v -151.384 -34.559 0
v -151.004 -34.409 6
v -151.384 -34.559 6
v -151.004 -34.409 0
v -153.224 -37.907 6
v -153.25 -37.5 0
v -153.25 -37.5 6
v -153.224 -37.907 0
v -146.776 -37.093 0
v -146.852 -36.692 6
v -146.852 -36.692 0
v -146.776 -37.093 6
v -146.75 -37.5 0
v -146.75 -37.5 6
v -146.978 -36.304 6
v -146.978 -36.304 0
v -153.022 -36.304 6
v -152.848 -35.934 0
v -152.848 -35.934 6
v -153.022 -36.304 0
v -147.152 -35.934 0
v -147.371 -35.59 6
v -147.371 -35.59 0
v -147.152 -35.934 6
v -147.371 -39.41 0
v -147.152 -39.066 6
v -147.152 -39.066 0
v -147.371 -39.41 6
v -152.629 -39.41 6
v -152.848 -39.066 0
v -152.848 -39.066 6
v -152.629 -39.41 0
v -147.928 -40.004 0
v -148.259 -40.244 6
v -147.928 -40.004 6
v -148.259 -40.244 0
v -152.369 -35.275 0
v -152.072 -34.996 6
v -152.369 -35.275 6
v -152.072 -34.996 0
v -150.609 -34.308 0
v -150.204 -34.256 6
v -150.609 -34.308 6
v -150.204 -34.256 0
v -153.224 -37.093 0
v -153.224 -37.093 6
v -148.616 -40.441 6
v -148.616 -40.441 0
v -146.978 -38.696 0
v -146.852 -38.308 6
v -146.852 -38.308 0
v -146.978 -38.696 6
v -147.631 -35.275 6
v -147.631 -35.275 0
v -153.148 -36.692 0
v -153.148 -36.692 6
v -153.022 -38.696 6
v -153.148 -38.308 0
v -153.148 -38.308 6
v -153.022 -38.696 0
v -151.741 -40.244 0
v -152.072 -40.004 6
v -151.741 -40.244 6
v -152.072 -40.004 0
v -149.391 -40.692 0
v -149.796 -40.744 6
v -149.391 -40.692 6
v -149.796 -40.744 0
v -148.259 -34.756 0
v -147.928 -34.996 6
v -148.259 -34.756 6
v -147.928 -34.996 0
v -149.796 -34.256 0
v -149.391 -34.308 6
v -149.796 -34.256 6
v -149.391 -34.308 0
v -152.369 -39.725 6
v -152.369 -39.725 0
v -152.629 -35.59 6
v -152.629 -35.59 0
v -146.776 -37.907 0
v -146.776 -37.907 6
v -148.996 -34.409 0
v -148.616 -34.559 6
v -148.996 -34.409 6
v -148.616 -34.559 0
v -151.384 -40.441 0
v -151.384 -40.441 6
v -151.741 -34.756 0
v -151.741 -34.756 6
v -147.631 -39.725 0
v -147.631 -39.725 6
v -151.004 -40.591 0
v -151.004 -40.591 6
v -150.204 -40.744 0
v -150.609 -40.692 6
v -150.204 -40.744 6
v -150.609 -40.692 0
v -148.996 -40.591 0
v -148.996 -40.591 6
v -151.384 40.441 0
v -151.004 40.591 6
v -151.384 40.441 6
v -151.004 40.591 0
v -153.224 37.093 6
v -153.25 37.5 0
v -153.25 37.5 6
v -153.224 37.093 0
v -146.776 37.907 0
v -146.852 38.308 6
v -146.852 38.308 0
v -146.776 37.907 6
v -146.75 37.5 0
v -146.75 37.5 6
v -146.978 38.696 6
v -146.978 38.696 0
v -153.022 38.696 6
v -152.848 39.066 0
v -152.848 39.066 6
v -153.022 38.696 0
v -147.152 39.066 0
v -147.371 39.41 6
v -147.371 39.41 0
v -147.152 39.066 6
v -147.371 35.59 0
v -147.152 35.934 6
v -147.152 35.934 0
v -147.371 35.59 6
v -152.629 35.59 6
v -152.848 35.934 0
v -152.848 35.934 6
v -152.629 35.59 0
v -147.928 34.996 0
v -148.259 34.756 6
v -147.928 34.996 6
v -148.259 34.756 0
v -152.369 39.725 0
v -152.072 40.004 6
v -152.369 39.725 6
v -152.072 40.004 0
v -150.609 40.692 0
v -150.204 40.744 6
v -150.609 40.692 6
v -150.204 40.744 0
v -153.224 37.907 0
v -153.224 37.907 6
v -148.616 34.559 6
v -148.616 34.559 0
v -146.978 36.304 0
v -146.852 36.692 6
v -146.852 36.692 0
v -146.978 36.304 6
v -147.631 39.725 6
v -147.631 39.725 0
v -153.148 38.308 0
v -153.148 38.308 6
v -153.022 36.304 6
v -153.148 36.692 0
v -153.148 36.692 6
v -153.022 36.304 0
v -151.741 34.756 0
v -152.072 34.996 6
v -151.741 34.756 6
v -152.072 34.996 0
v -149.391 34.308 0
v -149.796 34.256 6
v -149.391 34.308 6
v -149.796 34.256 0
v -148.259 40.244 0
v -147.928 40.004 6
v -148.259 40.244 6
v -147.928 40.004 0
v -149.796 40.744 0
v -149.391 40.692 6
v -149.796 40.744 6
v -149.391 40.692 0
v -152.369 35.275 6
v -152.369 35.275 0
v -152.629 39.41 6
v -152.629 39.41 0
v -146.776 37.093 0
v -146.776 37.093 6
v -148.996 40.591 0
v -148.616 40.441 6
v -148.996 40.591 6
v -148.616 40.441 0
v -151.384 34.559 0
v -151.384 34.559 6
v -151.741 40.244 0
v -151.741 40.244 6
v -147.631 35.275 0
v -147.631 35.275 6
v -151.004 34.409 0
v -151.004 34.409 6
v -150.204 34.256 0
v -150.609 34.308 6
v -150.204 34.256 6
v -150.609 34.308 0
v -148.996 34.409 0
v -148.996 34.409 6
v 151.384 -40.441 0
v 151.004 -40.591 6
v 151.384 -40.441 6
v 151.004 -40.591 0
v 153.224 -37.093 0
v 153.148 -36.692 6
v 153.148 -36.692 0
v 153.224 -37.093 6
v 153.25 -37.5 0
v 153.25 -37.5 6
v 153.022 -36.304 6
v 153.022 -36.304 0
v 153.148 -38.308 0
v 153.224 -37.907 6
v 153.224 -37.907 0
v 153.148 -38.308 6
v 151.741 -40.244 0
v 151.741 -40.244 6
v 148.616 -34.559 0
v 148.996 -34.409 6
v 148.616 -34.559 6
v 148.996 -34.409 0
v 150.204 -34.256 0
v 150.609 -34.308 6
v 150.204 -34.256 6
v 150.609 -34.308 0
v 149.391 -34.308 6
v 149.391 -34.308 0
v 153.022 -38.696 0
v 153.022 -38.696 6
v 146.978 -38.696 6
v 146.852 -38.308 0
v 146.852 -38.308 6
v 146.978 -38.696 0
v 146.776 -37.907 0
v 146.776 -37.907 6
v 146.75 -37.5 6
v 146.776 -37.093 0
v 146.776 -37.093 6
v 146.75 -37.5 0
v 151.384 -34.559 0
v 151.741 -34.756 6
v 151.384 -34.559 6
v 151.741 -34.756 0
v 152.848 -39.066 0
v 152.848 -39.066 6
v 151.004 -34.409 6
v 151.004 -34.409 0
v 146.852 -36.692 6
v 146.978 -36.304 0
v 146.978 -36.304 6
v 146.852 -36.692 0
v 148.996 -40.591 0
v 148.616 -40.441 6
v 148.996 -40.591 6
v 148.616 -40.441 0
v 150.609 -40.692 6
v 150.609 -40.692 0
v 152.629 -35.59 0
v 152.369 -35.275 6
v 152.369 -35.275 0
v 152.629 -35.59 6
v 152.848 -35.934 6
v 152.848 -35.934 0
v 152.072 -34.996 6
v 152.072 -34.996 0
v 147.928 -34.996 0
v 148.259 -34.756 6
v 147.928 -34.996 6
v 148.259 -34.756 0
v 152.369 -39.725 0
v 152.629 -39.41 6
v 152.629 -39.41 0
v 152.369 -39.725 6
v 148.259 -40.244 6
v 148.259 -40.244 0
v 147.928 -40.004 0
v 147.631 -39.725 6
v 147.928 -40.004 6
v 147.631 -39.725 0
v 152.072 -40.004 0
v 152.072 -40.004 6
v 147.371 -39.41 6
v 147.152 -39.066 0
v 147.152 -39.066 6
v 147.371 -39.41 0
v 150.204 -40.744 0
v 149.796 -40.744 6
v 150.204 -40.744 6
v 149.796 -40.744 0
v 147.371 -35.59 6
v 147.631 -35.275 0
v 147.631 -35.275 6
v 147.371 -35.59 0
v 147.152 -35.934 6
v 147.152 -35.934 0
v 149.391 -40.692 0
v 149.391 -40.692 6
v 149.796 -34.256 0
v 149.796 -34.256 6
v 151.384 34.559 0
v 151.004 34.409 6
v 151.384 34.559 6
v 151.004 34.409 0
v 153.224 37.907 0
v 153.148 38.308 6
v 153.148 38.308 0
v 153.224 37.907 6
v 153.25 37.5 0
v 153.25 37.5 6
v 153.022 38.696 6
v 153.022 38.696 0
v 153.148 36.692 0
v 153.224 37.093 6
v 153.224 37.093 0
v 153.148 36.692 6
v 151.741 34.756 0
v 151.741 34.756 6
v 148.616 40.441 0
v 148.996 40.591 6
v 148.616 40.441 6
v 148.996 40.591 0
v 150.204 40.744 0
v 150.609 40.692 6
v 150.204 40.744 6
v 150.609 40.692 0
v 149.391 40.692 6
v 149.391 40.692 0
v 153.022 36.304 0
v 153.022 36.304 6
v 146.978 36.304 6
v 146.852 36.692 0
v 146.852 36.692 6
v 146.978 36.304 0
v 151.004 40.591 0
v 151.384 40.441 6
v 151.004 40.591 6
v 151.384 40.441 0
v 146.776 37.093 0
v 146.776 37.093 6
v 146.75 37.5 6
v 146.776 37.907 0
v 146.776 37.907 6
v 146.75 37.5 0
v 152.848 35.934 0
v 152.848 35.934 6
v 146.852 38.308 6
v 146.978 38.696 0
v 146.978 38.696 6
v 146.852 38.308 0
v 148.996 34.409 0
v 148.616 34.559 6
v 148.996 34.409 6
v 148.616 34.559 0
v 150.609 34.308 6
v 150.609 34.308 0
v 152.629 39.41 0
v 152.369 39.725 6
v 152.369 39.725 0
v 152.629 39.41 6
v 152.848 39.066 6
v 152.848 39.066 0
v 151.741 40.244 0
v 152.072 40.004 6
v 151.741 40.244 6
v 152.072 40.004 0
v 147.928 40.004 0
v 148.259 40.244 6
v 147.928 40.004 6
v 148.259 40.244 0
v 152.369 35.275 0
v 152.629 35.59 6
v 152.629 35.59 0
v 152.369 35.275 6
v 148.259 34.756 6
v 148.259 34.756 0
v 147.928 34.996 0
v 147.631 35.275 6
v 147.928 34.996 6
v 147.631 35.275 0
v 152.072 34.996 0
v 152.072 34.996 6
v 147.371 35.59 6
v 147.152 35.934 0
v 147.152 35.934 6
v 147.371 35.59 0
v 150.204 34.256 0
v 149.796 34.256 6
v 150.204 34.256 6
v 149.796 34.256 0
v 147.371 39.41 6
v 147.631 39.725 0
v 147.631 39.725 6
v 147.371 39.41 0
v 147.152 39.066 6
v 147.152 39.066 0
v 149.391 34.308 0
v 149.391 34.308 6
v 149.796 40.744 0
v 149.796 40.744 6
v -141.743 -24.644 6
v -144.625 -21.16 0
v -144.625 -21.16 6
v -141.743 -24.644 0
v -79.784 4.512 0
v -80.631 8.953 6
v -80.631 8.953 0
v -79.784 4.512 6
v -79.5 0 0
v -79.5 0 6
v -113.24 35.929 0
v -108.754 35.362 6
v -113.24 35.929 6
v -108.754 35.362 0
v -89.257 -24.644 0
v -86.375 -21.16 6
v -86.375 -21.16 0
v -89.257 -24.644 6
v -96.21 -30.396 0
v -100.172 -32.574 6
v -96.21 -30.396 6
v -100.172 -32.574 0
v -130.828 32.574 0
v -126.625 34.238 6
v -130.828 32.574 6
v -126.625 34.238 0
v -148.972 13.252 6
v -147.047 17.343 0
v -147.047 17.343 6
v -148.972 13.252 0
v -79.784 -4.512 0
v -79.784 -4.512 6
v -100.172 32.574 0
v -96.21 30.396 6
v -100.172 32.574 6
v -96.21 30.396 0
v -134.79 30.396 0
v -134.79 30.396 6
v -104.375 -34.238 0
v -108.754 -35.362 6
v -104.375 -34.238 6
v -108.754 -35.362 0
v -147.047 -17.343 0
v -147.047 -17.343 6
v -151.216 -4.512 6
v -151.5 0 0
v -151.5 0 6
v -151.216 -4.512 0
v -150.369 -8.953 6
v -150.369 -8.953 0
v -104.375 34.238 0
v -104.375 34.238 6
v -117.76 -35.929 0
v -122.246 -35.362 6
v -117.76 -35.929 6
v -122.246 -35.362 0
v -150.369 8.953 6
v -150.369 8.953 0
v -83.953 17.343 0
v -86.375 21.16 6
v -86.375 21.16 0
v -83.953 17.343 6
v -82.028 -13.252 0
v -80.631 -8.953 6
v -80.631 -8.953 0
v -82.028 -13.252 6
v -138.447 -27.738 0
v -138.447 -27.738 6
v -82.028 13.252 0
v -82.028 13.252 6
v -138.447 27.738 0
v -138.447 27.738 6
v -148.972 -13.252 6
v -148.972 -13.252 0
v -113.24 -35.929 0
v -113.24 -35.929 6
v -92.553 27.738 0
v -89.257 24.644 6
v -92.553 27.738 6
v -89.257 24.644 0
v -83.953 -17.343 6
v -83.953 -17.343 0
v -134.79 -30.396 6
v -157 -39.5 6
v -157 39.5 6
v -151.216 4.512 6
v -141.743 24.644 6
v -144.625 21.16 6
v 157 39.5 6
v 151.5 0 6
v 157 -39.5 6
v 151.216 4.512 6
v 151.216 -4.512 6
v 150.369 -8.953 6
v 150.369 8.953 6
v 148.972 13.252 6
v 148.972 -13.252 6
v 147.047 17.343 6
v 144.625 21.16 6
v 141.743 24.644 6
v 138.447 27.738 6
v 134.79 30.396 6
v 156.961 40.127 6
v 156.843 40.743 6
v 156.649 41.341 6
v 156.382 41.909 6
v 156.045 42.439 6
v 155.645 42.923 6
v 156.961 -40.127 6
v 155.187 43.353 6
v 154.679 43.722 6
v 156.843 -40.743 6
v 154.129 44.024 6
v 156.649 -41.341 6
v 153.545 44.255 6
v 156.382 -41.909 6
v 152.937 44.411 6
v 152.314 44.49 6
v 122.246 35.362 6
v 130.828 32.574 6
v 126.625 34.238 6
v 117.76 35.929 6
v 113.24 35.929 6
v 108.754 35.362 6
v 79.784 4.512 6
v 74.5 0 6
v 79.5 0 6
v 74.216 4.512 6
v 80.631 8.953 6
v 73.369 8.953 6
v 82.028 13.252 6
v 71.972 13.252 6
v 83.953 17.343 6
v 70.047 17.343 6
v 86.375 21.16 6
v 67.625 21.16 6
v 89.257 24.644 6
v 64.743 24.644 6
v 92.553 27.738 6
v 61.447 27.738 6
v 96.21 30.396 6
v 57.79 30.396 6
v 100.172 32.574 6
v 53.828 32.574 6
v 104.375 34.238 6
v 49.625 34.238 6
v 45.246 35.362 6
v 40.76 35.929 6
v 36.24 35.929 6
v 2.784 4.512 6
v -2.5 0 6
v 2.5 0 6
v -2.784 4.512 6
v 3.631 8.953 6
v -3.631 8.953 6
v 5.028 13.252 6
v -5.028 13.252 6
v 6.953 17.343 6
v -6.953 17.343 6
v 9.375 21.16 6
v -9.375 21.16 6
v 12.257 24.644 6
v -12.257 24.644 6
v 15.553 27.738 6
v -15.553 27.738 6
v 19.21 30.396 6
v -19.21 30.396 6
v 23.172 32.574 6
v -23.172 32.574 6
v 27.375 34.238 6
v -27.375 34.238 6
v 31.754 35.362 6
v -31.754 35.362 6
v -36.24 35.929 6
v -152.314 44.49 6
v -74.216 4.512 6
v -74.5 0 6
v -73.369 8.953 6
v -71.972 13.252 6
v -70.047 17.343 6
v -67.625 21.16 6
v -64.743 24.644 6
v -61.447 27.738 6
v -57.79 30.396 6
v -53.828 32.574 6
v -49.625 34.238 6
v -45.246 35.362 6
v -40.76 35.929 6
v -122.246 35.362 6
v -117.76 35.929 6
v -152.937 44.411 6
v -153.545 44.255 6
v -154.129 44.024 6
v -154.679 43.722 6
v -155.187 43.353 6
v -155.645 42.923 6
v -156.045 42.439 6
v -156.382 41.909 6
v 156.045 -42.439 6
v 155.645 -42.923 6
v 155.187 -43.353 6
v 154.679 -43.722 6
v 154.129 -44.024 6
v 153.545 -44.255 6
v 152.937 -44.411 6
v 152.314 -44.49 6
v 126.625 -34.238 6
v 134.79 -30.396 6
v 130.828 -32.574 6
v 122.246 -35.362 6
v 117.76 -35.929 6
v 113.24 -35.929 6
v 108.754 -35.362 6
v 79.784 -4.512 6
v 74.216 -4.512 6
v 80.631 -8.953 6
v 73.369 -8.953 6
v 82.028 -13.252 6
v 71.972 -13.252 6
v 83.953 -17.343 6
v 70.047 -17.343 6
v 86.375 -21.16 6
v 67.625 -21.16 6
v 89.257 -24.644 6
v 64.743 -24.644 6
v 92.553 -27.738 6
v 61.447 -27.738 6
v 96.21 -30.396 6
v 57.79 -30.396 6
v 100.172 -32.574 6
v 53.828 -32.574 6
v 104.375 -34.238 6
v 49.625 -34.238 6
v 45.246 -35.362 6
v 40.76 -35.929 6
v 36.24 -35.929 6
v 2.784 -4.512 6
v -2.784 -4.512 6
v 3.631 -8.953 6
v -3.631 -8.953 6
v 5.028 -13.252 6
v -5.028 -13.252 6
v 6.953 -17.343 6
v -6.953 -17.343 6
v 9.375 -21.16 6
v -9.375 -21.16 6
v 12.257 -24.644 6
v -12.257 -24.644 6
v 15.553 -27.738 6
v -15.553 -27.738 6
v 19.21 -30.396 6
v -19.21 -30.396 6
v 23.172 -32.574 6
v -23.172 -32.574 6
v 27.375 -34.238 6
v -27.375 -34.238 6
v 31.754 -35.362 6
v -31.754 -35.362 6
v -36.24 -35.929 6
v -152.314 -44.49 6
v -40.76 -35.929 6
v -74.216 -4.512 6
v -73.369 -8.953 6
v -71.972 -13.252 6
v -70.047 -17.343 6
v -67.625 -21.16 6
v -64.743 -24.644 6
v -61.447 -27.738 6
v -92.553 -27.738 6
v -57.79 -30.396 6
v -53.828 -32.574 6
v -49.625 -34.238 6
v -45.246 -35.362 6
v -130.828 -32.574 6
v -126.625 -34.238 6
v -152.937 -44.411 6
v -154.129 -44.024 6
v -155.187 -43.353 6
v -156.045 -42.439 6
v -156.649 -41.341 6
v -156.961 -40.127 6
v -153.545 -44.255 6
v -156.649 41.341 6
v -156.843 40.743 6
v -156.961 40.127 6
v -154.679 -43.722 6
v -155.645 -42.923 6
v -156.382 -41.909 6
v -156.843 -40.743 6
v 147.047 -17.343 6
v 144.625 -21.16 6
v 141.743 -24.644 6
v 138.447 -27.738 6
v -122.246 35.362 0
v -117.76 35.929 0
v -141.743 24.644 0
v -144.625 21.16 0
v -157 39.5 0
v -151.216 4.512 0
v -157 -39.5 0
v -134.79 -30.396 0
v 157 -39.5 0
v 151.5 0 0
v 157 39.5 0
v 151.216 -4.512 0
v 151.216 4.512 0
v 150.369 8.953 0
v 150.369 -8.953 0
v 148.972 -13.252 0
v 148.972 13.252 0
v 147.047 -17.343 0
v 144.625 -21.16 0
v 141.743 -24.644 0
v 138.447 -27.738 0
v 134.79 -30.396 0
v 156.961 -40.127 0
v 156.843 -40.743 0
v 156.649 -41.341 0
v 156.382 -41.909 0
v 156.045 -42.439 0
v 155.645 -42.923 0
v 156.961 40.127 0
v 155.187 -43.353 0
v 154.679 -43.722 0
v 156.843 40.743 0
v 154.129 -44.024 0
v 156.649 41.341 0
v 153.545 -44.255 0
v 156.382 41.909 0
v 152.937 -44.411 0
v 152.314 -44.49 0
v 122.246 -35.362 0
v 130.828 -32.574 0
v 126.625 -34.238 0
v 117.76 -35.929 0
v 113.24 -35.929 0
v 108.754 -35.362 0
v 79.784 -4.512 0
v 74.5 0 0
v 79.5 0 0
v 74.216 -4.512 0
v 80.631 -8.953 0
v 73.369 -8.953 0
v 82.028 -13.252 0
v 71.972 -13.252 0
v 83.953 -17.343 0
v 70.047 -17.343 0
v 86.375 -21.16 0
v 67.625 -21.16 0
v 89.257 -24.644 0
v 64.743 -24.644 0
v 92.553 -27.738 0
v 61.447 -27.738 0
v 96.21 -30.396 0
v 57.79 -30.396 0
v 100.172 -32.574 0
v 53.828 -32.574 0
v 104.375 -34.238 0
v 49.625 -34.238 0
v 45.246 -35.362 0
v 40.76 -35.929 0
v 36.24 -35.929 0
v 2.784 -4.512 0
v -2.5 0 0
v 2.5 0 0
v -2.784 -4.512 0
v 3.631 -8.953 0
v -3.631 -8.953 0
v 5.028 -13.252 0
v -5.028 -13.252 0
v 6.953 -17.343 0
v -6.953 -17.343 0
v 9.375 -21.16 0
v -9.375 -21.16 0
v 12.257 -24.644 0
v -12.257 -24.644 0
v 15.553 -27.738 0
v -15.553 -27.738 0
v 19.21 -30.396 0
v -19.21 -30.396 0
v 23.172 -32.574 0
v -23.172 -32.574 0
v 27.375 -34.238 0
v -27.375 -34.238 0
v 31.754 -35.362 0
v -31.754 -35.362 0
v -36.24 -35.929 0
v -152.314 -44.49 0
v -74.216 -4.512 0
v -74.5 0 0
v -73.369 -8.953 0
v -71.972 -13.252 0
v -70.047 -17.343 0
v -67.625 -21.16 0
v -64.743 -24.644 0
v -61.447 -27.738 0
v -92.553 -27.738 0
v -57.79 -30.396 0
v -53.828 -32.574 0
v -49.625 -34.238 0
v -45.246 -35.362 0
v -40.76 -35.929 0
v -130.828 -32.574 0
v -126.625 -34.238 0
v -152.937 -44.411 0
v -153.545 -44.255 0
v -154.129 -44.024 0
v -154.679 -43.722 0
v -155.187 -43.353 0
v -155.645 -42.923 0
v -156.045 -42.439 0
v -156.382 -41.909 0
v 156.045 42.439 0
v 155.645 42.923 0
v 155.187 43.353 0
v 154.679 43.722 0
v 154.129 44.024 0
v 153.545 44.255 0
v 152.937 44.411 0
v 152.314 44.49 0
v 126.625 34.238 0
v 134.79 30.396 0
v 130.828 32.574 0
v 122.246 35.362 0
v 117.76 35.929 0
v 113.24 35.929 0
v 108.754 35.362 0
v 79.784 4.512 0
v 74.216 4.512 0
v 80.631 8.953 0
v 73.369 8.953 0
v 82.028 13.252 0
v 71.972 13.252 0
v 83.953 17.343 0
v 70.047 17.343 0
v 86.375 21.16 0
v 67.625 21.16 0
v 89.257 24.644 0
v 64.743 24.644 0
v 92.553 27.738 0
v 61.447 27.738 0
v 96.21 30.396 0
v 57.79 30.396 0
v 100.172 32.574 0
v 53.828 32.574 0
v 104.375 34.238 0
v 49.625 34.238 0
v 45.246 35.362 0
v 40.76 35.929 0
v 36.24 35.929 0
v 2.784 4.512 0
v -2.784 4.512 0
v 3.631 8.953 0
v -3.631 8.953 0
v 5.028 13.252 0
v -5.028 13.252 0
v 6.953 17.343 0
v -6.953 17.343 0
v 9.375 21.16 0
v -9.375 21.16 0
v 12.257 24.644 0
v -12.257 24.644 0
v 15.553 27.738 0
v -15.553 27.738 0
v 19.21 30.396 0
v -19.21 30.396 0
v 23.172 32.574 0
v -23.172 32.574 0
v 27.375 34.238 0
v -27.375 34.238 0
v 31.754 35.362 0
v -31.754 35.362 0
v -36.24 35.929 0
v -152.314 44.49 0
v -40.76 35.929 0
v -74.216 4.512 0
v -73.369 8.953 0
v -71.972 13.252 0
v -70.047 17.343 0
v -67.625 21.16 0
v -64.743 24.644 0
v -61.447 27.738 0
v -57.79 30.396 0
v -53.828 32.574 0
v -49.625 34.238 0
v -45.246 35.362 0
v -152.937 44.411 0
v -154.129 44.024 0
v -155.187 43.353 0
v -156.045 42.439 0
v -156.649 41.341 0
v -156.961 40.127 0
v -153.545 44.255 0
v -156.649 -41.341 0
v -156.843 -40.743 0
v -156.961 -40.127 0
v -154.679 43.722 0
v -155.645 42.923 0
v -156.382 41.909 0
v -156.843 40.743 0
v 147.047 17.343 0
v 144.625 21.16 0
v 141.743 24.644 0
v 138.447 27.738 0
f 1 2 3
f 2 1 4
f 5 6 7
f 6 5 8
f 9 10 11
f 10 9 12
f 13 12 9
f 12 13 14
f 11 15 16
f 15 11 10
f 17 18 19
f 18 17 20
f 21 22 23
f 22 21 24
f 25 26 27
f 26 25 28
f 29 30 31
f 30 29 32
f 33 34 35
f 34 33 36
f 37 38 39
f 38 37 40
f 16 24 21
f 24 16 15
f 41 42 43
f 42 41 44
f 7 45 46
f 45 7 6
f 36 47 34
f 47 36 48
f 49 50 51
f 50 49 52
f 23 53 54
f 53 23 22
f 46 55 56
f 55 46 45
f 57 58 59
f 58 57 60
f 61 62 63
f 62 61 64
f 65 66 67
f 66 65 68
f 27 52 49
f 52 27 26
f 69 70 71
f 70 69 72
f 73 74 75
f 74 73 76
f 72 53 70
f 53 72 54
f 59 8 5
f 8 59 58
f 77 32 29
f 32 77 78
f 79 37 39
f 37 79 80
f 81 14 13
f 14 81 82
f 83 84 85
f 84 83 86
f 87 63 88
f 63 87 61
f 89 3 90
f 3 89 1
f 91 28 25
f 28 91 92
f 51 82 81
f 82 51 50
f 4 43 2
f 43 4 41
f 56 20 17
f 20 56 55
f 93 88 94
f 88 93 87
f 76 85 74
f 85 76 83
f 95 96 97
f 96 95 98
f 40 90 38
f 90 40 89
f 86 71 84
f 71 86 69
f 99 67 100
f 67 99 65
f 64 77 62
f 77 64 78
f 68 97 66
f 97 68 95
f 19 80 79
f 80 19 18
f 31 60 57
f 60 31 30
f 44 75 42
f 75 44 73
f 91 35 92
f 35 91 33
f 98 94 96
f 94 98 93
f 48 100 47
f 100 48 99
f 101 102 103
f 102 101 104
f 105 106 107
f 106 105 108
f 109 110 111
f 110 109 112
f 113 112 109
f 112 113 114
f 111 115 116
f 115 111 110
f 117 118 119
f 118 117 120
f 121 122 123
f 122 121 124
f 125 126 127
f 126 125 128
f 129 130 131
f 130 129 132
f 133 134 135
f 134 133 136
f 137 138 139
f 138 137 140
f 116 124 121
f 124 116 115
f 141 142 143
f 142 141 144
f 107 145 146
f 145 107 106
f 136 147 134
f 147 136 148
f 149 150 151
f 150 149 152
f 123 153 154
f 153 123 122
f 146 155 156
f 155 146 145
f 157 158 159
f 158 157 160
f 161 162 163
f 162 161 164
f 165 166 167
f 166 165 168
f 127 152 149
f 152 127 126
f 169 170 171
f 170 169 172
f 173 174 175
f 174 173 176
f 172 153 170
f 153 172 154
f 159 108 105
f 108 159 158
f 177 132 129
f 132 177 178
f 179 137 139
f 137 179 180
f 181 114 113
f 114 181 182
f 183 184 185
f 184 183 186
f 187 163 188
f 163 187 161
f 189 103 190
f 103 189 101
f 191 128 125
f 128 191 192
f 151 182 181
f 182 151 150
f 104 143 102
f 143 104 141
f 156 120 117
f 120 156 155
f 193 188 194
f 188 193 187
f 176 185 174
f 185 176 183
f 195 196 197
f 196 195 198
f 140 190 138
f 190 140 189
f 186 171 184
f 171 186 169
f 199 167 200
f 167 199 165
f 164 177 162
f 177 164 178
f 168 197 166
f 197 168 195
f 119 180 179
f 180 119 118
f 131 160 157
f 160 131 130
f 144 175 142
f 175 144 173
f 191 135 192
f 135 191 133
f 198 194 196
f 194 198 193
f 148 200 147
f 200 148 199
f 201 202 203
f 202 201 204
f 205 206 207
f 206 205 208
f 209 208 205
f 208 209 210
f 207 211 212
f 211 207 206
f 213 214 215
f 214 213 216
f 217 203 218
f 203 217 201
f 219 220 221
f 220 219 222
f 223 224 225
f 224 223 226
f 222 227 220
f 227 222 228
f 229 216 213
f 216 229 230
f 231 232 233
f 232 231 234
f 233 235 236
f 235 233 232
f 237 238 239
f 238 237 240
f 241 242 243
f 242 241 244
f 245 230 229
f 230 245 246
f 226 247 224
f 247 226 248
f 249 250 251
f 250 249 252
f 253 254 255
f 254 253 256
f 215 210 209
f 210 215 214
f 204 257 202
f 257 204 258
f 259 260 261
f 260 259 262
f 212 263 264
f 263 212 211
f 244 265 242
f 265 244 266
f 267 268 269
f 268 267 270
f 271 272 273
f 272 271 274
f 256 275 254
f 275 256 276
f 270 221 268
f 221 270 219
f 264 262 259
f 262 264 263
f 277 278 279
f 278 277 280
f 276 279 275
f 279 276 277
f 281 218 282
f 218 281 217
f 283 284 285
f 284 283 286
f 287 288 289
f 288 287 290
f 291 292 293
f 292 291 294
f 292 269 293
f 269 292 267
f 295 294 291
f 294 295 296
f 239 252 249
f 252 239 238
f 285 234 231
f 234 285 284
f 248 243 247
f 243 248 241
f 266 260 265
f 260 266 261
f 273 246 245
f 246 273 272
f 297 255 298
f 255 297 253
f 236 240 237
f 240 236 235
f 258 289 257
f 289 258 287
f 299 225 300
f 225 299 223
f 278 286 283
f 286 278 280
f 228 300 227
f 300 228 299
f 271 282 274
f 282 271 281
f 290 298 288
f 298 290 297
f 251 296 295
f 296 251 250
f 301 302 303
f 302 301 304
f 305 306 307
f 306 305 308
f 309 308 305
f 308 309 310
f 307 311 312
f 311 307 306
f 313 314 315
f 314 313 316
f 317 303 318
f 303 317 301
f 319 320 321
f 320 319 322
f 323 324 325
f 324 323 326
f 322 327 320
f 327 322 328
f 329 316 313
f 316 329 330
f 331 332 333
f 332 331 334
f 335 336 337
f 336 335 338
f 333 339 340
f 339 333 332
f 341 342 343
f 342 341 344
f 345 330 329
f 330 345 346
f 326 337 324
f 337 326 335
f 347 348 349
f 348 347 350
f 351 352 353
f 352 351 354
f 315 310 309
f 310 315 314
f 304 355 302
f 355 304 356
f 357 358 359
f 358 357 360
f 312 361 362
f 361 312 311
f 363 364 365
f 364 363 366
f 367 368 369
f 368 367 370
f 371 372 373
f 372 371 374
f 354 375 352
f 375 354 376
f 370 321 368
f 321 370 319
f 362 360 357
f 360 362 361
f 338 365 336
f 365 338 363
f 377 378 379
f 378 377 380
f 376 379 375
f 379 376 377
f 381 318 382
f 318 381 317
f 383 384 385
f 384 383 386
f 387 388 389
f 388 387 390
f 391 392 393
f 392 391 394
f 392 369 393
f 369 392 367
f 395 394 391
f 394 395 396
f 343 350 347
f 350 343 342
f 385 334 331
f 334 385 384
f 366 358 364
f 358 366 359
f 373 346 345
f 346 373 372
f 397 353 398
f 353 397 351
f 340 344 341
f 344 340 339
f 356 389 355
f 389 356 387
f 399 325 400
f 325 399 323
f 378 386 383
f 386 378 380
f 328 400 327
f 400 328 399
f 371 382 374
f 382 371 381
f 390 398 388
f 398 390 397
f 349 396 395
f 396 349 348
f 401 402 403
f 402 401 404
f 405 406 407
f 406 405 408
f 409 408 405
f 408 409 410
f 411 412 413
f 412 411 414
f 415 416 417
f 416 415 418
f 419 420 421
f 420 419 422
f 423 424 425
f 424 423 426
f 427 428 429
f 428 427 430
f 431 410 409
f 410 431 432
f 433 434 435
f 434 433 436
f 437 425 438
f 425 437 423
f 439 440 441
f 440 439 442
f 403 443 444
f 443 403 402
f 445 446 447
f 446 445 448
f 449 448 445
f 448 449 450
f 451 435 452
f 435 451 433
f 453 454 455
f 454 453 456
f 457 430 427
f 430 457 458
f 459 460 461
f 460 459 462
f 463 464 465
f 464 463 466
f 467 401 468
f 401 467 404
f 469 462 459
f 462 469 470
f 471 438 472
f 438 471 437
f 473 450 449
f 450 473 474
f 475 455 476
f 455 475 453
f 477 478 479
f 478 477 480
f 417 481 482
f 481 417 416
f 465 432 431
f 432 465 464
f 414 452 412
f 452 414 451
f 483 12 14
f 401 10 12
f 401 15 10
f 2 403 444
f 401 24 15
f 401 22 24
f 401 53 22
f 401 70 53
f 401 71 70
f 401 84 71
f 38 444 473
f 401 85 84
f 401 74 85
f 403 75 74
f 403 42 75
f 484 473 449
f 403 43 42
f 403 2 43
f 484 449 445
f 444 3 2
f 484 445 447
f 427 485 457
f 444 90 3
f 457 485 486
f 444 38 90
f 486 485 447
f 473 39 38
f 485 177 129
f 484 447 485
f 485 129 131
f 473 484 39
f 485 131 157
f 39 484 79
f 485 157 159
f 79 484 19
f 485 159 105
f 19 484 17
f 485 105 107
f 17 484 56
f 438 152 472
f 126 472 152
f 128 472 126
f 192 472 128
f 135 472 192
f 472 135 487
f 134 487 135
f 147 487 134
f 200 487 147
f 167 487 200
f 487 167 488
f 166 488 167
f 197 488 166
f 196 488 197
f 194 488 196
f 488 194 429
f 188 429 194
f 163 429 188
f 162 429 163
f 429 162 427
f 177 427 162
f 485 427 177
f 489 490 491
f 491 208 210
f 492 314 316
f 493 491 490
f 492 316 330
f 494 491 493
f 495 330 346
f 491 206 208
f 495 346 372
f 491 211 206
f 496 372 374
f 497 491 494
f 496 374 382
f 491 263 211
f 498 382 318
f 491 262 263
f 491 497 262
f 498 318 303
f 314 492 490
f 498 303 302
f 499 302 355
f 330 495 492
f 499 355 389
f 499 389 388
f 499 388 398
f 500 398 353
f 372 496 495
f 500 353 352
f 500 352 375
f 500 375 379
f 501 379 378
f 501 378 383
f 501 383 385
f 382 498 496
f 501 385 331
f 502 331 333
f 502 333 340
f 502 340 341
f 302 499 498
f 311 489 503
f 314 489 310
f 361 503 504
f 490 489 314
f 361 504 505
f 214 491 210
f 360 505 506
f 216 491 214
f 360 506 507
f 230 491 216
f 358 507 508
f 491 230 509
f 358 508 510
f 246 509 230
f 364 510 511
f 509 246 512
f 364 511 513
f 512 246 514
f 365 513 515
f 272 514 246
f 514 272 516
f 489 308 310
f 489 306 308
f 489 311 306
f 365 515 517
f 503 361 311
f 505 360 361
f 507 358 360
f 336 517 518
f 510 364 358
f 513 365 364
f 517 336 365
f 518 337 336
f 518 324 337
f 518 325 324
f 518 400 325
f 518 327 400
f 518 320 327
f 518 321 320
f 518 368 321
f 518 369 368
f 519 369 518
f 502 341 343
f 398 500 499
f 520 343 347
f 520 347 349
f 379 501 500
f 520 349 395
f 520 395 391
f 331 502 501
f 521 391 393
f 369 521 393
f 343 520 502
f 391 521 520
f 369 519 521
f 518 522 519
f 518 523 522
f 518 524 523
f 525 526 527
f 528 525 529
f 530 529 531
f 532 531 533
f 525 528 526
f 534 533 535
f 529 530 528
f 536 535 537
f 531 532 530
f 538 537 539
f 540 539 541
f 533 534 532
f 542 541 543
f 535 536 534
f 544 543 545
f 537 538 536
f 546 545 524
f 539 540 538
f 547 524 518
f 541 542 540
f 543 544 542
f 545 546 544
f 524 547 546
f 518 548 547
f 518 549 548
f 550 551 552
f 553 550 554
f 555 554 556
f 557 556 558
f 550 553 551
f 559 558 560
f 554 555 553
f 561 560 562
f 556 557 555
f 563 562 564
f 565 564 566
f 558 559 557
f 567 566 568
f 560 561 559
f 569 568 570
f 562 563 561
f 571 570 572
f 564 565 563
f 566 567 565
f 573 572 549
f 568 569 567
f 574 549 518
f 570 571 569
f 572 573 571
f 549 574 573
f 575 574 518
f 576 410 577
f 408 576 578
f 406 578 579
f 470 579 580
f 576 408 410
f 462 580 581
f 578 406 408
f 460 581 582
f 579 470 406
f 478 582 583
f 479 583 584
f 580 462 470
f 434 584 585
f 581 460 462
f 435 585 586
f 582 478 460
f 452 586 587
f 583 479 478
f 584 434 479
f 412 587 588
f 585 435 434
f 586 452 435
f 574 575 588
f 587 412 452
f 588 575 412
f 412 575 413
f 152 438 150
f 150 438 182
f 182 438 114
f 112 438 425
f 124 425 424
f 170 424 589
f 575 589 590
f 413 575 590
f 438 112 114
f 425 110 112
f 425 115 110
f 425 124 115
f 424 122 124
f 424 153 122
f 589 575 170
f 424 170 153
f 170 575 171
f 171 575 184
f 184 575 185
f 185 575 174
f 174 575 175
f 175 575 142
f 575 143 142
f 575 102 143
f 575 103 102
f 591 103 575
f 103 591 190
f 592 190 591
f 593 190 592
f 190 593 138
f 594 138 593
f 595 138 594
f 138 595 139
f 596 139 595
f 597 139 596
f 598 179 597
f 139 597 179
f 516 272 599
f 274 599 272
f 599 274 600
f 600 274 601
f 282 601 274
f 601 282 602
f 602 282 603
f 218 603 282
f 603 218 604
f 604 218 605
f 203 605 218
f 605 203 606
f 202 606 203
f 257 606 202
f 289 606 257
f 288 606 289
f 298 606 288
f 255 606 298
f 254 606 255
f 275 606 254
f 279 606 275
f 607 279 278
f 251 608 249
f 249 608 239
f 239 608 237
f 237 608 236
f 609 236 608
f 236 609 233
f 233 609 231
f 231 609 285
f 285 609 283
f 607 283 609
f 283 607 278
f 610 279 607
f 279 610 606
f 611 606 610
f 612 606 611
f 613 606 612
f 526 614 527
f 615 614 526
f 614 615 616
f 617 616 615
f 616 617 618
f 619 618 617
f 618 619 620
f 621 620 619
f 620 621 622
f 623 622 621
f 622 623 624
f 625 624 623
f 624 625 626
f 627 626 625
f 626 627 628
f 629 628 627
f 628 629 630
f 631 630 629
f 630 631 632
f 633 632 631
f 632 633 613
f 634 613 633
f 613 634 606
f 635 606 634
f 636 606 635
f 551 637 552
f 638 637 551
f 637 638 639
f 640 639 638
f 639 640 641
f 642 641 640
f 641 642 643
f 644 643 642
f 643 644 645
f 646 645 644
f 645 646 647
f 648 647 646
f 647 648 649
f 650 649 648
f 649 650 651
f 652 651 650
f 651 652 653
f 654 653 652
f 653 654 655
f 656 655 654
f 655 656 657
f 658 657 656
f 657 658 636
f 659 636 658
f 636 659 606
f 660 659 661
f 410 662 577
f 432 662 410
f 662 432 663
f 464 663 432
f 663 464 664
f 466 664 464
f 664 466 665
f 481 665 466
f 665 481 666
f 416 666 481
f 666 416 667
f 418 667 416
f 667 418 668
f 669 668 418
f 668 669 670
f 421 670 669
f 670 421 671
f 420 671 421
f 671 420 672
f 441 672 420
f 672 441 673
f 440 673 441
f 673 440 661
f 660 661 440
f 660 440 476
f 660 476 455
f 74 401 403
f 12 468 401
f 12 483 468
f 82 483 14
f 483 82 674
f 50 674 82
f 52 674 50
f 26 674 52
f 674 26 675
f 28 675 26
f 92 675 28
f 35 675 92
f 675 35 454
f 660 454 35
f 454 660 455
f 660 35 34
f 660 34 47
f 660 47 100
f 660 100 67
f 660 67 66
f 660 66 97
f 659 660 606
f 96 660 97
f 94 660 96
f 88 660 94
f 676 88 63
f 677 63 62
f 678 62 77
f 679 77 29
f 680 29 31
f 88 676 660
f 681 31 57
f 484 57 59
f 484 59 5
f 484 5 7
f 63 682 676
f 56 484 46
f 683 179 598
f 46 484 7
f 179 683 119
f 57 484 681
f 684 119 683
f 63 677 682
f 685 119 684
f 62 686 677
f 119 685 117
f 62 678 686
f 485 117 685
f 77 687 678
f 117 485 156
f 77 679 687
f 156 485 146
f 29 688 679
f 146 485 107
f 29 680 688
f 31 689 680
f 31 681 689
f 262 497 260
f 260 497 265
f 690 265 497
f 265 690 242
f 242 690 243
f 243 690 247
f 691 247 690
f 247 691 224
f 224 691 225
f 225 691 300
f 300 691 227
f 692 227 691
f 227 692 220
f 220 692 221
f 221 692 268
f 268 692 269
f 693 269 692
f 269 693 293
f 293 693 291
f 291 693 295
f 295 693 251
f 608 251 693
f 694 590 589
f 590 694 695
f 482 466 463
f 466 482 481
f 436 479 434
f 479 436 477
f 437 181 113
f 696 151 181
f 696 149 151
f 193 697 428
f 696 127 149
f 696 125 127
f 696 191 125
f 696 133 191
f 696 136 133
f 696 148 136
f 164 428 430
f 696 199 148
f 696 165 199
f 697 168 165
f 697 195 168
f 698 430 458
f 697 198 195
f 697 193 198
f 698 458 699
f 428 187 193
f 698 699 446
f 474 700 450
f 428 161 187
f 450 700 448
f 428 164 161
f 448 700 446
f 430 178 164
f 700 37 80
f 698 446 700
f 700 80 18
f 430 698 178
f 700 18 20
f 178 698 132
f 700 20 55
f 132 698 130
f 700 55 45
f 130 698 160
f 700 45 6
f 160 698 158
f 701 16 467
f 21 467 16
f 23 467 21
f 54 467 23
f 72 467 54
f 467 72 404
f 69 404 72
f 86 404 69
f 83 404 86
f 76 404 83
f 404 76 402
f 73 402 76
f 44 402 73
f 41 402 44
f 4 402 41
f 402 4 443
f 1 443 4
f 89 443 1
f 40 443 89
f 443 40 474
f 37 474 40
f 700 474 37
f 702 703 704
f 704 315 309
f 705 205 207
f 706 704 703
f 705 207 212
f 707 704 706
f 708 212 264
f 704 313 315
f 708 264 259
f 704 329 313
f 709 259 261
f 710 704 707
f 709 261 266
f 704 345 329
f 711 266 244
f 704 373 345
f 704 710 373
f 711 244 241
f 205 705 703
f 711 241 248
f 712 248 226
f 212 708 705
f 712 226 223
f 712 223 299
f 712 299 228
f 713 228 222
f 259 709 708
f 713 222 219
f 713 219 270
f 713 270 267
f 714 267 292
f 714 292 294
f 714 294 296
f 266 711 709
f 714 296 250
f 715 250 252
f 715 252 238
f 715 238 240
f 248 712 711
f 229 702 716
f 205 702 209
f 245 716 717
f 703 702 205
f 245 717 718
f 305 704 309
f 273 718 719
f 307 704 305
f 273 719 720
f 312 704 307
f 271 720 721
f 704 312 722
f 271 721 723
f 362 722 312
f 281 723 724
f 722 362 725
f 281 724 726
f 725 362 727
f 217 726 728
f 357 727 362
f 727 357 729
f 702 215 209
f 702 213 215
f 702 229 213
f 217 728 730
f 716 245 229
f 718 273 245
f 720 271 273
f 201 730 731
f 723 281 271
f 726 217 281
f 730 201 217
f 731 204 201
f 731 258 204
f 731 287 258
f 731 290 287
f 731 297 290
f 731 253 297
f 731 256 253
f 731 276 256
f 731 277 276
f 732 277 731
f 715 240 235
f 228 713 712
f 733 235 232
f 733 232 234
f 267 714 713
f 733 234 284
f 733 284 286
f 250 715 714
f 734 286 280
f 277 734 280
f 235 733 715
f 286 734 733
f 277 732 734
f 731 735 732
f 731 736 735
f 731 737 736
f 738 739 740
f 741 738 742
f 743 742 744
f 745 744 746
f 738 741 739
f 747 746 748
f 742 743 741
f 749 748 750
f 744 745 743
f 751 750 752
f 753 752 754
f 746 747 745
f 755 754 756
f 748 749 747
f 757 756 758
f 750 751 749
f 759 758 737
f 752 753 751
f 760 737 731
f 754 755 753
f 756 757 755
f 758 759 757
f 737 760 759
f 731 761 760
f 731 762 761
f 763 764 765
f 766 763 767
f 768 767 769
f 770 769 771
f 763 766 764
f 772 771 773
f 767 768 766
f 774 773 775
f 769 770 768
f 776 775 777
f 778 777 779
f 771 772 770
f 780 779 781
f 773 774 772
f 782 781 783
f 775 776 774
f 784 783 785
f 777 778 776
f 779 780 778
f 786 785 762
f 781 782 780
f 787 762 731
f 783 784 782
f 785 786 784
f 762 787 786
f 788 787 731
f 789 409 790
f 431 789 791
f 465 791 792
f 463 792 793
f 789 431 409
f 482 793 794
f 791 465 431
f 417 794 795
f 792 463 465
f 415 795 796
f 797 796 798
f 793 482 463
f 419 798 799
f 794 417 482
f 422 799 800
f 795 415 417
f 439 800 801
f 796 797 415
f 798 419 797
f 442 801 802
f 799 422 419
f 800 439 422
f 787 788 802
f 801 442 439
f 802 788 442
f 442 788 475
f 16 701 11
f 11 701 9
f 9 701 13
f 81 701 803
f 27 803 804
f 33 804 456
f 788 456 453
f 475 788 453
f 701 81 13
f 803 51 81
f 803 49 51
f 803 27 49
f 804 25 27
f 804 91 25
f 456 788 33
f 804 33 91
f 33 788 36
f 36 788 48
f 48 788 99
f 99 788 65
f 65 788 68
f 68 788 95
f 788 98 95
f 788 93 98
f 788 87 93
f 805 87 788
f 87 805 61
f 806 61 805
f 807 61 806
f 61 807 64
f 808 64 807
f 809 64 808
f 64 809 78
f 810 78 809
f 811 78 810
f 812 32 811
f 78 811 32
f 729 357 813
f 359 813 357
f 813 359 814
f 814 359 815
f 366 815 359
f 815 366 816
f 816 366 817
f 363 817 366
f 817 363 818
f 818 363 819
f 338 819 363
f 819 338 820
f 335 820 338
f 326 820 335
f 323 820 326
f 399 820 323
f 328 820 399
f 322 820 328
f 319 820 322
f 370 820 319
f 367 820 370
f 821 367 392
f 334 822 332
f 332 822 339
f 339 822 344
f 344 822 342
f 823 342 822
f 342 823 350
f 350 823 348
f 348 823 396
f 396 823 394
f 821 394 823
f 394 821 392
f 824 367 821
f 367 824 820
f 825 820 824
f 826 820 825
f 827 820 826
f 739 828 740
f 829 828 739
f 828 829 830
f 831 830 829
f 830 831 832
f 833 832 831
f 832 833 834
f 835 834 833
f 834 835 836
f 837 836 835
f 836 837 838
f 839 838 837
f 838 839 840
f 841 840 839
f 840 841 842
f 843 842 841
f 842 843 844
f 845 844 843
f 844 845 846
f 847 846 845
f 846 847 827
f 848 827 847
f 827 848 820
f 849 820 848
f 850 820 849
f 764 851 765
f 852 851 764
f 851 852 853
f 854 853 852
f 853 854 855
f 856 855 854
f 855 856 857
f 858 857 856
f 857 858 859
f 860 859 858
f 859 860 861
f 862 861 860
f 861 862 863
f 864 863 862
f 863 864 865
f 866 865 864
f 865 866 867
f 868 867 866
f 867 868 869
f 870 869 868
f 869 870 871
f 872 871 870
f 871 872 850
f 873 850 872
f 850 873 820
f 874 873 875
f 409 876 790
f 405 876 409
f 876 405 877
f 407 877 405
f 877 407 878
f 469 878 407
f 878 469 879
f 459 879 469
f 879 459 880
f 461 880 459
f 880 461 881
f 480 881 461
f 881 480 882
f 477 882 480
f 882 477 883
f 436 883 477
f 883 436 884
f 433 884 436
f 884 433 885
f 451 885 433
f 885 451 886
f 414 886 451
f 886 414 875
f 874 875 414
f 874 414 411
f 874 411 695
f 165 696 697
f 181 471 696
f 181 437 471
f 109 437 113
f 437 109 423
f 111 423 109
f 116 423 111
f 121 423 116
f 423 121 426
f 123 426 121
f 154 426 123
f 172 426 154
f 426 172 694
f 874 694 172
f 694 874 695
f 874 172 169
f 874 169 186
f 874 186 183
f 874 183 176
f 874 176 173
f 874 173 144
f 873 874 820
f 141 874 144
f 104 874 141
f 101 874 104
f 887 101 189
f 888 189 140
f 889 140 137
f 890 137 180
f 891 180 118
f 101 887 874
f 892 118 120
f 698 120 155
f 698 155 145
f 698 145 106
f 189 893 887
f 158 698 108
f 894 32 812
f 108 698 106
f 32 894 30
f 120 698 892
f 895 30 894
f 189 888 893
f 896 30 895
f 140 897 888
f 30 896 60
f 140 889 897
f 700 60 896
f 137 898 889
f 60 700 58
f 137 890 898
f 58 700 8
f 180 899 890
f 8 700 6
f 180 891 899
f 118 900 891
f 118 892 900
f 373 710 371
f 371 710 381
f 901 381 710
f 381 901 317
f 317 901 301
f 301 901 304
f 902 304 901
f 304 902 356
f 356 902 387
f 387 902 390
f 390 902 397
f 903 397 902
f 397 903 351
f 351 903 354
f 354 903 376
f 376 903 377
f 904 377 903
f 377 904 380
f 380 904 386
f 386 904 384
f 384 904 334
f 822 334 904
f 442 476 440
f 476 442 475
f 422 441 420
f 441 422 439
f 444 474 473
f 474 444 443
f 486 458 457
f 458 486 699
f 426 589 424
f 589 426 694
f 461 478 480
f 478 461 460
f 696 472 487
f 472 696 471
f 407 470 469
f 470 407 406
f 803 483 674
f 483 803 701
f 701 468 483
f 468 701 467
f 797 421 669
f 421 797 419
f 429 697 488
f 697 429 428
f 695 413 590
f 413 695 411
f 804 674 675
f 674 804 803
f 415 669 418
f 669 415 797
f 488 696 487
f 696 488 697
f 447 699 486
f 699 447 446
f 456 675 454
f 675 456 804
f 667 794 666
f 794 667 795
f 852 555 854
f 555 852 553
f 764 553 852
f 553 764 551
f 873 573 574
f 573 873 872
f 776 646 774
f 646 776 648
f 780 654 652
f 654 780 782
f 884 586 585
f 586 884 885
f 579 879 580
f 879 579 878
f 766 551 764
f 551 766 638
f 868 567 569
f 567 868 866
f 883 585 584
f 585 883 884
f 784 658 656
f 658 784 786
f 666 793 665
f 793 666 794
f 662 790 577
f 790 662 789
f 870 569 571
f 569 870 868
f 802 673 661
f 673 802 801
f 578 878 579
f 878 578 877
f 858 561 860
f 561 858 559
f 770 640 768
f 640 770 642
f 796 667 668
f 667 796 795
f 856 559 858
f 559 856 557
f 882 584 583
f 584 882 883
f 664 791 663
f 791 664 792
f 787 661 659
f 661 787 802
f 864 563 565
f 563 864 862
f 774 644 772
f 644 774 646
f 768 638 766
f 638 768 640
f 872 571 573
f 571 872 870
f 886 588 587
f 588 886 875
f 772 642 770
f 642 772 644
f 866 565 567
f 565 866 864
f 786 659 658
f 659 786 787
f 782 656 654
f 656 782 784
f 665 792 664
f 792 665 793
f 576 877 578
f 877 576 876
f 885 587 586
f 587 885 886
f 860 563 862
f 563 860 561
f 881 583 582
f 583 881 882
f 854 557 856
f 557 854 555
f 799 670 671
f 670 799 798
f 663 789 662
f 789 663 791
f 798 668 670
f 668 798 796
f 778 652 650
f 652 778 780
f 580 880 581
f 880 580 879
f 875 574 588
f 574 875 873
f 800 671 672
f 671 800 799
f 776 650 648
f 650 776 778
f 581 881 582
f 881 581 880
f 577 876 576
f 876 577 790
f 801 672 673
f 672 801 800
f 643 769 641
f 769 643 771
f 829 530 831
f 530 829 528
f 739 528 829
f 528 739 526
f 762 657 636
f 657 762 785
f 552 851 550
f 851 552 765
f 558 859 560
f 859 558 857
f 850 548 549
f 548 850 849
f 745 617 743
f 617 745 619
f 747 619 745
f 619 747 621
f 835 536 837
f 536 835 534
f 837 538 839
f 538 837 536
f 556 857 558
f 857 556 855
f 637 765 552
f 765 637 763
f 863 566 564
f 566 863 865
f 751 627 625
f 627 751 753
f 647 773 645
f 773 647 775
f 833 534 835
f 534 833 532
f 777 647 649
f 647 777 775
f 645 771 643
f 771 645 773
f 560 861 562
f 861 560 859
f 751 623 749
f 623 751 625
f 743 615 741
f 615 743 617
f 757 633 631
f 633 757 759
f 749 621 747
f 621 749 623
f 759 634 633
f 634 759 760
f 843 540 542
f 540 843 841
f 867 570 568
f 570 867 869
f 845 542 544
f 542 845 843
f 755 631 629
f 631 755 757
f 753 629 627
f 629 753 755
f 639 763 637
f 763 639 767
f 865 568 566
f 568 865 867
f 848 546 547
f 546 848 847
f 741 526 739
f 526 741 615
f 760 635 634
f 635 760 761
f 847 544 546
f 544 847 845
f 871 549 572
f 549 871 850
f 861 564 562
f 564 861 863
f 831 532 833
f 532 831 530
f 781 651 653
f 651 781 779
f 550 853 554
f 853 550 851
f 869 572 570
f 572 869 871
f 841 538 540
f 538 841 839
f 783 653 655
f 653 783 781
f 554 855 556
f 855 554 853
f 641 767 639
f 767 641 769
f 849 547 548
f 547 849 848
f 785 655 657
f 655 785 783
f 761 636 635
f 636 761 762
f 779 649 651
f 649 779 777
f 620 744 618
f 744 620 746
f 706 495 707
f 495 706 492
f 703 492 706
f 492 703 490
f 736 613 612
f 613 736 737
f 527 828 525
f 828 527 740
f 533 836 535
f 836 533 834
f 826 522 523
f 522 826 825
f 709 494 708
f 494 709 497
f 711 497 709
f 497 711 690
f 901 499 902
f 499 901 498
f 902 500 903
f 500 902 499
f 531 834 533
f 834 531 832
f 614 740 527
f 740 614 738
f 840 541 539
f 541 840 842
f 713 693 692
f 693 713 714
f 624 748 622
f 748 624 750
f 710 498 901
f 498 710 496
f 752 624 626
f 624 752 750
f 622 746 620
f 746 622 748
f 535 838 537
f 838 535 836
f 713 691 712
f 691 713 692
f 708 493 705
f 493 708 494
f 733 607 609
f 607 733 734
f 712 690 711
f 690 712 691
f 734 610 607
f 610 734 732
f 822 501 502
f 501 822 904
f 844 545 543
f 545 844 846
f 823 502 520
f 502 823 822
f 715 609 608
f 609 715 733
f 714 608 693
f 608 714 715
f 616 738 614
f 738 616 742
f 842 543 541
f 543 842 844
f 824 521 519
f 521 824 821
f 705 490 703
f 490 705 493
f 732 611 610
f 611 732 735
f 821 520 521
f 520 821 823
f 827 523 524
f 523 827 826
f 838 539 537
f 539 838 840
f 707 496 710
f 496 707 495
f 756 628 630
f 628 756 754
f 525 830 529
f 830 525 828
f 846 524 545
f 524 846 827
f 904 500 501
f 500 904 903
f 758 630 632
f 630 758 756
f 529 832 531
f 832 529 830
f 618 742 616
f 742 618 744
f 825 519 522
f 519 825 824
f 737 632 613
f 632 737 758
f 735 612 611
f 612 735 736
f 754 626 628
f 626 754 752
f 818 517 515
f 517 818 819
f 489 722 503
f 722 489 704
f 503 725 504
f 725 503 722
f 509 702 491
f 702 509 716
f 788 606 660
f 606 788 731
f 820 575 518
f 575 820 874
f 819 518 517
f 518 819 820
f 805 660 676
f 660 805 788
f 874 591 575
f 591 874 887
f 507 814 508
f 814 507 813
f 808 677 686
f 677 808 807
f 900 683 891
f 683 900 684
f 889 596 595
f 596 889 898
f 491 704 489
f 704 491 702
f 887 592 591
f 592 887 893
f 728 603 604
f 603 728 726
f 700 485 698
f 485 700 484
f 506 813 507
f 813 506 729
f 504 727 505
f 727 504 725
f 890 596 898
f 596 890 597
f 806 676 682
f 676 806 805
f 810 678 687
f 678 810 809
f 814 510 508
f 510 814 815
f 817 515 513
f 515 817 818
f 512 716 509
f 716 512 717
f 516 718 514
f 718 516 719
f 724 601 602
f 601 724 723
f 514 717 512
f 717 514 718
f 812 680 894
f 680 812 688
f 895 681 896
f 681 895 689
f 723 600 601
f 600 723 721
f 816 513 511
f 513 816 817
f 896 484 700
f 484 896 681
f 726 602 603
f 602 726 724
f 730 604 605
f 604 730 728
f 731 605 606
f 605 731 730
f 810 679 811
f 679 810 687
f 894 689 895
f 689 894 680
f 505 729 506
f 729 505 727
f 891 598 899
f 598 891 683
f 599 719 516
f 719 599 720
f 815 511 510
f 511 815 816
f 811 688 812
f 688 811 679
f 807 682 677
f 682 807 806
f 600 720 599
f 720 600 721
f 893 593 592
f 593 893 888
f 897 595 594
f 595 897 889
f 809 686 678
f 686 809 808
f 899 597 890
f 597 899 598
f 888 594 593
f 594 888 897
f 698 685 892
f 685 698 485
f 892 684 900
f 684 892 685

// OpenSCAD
$fn = 50;


difference() {
	union() {
		hull() {
			translate(v = [-152.0000000000, 39.5000000000, 0]) {
				cylinder(h = 6, r = 5);
			}
			translate(v = [152.0000000000, 39.5000000000, 0]) {
				cylinder(h = 6, r = 5);
			}
			translate(v = [-152.0000000000, -39.5000000000, 0]) {
				cylinder(h = 6, r = 5);
			}
			translate(v = [152.0000000000, -39.5000000000, 0]) {
				cylinder(h = 6, r = 5);
			}
		}
	}
	union() {
		#translate(v = [-150.0000000000, -37.5000000000, -100.0000000000]) {
			cylinder(h = 200, r = 3.2500000000);
		}
		#translate(v = [-150.0000000000, 37.5000000000, -100.0000000000]) {
			cylinder(h = 200, r = 3.2500000000);
		}
		#translate(v = [150.0000000000, -37.5000000000, -100.0000000000]) {
			cylinder(h = 200, r = 3.2500000000);
		}
		#translate(v = [150.0000000000, 37.5000000000, -100.0000000000]) {
			cylinder(h = 200, r = 3.2500000000);
		}
		#translate(v = [-115.5000000000, 0, 0]) {
			cylinder(h = 6, r = 36.0000000000);
		}
		#translate(v = [-38.5000000000, 0, 0]) {
			cylinder(h = 6, r = 36.0000000000);
		}
		#translate(v = [38.5000000000, 0, 0]) {
			cylinder(h = 6, r = 36.0000000000);
		}
		#translate(v = [115.5000000000, 0, 0]) {
			cylinder(h = 6, r = 36.0000000000);
		}
	}
}
